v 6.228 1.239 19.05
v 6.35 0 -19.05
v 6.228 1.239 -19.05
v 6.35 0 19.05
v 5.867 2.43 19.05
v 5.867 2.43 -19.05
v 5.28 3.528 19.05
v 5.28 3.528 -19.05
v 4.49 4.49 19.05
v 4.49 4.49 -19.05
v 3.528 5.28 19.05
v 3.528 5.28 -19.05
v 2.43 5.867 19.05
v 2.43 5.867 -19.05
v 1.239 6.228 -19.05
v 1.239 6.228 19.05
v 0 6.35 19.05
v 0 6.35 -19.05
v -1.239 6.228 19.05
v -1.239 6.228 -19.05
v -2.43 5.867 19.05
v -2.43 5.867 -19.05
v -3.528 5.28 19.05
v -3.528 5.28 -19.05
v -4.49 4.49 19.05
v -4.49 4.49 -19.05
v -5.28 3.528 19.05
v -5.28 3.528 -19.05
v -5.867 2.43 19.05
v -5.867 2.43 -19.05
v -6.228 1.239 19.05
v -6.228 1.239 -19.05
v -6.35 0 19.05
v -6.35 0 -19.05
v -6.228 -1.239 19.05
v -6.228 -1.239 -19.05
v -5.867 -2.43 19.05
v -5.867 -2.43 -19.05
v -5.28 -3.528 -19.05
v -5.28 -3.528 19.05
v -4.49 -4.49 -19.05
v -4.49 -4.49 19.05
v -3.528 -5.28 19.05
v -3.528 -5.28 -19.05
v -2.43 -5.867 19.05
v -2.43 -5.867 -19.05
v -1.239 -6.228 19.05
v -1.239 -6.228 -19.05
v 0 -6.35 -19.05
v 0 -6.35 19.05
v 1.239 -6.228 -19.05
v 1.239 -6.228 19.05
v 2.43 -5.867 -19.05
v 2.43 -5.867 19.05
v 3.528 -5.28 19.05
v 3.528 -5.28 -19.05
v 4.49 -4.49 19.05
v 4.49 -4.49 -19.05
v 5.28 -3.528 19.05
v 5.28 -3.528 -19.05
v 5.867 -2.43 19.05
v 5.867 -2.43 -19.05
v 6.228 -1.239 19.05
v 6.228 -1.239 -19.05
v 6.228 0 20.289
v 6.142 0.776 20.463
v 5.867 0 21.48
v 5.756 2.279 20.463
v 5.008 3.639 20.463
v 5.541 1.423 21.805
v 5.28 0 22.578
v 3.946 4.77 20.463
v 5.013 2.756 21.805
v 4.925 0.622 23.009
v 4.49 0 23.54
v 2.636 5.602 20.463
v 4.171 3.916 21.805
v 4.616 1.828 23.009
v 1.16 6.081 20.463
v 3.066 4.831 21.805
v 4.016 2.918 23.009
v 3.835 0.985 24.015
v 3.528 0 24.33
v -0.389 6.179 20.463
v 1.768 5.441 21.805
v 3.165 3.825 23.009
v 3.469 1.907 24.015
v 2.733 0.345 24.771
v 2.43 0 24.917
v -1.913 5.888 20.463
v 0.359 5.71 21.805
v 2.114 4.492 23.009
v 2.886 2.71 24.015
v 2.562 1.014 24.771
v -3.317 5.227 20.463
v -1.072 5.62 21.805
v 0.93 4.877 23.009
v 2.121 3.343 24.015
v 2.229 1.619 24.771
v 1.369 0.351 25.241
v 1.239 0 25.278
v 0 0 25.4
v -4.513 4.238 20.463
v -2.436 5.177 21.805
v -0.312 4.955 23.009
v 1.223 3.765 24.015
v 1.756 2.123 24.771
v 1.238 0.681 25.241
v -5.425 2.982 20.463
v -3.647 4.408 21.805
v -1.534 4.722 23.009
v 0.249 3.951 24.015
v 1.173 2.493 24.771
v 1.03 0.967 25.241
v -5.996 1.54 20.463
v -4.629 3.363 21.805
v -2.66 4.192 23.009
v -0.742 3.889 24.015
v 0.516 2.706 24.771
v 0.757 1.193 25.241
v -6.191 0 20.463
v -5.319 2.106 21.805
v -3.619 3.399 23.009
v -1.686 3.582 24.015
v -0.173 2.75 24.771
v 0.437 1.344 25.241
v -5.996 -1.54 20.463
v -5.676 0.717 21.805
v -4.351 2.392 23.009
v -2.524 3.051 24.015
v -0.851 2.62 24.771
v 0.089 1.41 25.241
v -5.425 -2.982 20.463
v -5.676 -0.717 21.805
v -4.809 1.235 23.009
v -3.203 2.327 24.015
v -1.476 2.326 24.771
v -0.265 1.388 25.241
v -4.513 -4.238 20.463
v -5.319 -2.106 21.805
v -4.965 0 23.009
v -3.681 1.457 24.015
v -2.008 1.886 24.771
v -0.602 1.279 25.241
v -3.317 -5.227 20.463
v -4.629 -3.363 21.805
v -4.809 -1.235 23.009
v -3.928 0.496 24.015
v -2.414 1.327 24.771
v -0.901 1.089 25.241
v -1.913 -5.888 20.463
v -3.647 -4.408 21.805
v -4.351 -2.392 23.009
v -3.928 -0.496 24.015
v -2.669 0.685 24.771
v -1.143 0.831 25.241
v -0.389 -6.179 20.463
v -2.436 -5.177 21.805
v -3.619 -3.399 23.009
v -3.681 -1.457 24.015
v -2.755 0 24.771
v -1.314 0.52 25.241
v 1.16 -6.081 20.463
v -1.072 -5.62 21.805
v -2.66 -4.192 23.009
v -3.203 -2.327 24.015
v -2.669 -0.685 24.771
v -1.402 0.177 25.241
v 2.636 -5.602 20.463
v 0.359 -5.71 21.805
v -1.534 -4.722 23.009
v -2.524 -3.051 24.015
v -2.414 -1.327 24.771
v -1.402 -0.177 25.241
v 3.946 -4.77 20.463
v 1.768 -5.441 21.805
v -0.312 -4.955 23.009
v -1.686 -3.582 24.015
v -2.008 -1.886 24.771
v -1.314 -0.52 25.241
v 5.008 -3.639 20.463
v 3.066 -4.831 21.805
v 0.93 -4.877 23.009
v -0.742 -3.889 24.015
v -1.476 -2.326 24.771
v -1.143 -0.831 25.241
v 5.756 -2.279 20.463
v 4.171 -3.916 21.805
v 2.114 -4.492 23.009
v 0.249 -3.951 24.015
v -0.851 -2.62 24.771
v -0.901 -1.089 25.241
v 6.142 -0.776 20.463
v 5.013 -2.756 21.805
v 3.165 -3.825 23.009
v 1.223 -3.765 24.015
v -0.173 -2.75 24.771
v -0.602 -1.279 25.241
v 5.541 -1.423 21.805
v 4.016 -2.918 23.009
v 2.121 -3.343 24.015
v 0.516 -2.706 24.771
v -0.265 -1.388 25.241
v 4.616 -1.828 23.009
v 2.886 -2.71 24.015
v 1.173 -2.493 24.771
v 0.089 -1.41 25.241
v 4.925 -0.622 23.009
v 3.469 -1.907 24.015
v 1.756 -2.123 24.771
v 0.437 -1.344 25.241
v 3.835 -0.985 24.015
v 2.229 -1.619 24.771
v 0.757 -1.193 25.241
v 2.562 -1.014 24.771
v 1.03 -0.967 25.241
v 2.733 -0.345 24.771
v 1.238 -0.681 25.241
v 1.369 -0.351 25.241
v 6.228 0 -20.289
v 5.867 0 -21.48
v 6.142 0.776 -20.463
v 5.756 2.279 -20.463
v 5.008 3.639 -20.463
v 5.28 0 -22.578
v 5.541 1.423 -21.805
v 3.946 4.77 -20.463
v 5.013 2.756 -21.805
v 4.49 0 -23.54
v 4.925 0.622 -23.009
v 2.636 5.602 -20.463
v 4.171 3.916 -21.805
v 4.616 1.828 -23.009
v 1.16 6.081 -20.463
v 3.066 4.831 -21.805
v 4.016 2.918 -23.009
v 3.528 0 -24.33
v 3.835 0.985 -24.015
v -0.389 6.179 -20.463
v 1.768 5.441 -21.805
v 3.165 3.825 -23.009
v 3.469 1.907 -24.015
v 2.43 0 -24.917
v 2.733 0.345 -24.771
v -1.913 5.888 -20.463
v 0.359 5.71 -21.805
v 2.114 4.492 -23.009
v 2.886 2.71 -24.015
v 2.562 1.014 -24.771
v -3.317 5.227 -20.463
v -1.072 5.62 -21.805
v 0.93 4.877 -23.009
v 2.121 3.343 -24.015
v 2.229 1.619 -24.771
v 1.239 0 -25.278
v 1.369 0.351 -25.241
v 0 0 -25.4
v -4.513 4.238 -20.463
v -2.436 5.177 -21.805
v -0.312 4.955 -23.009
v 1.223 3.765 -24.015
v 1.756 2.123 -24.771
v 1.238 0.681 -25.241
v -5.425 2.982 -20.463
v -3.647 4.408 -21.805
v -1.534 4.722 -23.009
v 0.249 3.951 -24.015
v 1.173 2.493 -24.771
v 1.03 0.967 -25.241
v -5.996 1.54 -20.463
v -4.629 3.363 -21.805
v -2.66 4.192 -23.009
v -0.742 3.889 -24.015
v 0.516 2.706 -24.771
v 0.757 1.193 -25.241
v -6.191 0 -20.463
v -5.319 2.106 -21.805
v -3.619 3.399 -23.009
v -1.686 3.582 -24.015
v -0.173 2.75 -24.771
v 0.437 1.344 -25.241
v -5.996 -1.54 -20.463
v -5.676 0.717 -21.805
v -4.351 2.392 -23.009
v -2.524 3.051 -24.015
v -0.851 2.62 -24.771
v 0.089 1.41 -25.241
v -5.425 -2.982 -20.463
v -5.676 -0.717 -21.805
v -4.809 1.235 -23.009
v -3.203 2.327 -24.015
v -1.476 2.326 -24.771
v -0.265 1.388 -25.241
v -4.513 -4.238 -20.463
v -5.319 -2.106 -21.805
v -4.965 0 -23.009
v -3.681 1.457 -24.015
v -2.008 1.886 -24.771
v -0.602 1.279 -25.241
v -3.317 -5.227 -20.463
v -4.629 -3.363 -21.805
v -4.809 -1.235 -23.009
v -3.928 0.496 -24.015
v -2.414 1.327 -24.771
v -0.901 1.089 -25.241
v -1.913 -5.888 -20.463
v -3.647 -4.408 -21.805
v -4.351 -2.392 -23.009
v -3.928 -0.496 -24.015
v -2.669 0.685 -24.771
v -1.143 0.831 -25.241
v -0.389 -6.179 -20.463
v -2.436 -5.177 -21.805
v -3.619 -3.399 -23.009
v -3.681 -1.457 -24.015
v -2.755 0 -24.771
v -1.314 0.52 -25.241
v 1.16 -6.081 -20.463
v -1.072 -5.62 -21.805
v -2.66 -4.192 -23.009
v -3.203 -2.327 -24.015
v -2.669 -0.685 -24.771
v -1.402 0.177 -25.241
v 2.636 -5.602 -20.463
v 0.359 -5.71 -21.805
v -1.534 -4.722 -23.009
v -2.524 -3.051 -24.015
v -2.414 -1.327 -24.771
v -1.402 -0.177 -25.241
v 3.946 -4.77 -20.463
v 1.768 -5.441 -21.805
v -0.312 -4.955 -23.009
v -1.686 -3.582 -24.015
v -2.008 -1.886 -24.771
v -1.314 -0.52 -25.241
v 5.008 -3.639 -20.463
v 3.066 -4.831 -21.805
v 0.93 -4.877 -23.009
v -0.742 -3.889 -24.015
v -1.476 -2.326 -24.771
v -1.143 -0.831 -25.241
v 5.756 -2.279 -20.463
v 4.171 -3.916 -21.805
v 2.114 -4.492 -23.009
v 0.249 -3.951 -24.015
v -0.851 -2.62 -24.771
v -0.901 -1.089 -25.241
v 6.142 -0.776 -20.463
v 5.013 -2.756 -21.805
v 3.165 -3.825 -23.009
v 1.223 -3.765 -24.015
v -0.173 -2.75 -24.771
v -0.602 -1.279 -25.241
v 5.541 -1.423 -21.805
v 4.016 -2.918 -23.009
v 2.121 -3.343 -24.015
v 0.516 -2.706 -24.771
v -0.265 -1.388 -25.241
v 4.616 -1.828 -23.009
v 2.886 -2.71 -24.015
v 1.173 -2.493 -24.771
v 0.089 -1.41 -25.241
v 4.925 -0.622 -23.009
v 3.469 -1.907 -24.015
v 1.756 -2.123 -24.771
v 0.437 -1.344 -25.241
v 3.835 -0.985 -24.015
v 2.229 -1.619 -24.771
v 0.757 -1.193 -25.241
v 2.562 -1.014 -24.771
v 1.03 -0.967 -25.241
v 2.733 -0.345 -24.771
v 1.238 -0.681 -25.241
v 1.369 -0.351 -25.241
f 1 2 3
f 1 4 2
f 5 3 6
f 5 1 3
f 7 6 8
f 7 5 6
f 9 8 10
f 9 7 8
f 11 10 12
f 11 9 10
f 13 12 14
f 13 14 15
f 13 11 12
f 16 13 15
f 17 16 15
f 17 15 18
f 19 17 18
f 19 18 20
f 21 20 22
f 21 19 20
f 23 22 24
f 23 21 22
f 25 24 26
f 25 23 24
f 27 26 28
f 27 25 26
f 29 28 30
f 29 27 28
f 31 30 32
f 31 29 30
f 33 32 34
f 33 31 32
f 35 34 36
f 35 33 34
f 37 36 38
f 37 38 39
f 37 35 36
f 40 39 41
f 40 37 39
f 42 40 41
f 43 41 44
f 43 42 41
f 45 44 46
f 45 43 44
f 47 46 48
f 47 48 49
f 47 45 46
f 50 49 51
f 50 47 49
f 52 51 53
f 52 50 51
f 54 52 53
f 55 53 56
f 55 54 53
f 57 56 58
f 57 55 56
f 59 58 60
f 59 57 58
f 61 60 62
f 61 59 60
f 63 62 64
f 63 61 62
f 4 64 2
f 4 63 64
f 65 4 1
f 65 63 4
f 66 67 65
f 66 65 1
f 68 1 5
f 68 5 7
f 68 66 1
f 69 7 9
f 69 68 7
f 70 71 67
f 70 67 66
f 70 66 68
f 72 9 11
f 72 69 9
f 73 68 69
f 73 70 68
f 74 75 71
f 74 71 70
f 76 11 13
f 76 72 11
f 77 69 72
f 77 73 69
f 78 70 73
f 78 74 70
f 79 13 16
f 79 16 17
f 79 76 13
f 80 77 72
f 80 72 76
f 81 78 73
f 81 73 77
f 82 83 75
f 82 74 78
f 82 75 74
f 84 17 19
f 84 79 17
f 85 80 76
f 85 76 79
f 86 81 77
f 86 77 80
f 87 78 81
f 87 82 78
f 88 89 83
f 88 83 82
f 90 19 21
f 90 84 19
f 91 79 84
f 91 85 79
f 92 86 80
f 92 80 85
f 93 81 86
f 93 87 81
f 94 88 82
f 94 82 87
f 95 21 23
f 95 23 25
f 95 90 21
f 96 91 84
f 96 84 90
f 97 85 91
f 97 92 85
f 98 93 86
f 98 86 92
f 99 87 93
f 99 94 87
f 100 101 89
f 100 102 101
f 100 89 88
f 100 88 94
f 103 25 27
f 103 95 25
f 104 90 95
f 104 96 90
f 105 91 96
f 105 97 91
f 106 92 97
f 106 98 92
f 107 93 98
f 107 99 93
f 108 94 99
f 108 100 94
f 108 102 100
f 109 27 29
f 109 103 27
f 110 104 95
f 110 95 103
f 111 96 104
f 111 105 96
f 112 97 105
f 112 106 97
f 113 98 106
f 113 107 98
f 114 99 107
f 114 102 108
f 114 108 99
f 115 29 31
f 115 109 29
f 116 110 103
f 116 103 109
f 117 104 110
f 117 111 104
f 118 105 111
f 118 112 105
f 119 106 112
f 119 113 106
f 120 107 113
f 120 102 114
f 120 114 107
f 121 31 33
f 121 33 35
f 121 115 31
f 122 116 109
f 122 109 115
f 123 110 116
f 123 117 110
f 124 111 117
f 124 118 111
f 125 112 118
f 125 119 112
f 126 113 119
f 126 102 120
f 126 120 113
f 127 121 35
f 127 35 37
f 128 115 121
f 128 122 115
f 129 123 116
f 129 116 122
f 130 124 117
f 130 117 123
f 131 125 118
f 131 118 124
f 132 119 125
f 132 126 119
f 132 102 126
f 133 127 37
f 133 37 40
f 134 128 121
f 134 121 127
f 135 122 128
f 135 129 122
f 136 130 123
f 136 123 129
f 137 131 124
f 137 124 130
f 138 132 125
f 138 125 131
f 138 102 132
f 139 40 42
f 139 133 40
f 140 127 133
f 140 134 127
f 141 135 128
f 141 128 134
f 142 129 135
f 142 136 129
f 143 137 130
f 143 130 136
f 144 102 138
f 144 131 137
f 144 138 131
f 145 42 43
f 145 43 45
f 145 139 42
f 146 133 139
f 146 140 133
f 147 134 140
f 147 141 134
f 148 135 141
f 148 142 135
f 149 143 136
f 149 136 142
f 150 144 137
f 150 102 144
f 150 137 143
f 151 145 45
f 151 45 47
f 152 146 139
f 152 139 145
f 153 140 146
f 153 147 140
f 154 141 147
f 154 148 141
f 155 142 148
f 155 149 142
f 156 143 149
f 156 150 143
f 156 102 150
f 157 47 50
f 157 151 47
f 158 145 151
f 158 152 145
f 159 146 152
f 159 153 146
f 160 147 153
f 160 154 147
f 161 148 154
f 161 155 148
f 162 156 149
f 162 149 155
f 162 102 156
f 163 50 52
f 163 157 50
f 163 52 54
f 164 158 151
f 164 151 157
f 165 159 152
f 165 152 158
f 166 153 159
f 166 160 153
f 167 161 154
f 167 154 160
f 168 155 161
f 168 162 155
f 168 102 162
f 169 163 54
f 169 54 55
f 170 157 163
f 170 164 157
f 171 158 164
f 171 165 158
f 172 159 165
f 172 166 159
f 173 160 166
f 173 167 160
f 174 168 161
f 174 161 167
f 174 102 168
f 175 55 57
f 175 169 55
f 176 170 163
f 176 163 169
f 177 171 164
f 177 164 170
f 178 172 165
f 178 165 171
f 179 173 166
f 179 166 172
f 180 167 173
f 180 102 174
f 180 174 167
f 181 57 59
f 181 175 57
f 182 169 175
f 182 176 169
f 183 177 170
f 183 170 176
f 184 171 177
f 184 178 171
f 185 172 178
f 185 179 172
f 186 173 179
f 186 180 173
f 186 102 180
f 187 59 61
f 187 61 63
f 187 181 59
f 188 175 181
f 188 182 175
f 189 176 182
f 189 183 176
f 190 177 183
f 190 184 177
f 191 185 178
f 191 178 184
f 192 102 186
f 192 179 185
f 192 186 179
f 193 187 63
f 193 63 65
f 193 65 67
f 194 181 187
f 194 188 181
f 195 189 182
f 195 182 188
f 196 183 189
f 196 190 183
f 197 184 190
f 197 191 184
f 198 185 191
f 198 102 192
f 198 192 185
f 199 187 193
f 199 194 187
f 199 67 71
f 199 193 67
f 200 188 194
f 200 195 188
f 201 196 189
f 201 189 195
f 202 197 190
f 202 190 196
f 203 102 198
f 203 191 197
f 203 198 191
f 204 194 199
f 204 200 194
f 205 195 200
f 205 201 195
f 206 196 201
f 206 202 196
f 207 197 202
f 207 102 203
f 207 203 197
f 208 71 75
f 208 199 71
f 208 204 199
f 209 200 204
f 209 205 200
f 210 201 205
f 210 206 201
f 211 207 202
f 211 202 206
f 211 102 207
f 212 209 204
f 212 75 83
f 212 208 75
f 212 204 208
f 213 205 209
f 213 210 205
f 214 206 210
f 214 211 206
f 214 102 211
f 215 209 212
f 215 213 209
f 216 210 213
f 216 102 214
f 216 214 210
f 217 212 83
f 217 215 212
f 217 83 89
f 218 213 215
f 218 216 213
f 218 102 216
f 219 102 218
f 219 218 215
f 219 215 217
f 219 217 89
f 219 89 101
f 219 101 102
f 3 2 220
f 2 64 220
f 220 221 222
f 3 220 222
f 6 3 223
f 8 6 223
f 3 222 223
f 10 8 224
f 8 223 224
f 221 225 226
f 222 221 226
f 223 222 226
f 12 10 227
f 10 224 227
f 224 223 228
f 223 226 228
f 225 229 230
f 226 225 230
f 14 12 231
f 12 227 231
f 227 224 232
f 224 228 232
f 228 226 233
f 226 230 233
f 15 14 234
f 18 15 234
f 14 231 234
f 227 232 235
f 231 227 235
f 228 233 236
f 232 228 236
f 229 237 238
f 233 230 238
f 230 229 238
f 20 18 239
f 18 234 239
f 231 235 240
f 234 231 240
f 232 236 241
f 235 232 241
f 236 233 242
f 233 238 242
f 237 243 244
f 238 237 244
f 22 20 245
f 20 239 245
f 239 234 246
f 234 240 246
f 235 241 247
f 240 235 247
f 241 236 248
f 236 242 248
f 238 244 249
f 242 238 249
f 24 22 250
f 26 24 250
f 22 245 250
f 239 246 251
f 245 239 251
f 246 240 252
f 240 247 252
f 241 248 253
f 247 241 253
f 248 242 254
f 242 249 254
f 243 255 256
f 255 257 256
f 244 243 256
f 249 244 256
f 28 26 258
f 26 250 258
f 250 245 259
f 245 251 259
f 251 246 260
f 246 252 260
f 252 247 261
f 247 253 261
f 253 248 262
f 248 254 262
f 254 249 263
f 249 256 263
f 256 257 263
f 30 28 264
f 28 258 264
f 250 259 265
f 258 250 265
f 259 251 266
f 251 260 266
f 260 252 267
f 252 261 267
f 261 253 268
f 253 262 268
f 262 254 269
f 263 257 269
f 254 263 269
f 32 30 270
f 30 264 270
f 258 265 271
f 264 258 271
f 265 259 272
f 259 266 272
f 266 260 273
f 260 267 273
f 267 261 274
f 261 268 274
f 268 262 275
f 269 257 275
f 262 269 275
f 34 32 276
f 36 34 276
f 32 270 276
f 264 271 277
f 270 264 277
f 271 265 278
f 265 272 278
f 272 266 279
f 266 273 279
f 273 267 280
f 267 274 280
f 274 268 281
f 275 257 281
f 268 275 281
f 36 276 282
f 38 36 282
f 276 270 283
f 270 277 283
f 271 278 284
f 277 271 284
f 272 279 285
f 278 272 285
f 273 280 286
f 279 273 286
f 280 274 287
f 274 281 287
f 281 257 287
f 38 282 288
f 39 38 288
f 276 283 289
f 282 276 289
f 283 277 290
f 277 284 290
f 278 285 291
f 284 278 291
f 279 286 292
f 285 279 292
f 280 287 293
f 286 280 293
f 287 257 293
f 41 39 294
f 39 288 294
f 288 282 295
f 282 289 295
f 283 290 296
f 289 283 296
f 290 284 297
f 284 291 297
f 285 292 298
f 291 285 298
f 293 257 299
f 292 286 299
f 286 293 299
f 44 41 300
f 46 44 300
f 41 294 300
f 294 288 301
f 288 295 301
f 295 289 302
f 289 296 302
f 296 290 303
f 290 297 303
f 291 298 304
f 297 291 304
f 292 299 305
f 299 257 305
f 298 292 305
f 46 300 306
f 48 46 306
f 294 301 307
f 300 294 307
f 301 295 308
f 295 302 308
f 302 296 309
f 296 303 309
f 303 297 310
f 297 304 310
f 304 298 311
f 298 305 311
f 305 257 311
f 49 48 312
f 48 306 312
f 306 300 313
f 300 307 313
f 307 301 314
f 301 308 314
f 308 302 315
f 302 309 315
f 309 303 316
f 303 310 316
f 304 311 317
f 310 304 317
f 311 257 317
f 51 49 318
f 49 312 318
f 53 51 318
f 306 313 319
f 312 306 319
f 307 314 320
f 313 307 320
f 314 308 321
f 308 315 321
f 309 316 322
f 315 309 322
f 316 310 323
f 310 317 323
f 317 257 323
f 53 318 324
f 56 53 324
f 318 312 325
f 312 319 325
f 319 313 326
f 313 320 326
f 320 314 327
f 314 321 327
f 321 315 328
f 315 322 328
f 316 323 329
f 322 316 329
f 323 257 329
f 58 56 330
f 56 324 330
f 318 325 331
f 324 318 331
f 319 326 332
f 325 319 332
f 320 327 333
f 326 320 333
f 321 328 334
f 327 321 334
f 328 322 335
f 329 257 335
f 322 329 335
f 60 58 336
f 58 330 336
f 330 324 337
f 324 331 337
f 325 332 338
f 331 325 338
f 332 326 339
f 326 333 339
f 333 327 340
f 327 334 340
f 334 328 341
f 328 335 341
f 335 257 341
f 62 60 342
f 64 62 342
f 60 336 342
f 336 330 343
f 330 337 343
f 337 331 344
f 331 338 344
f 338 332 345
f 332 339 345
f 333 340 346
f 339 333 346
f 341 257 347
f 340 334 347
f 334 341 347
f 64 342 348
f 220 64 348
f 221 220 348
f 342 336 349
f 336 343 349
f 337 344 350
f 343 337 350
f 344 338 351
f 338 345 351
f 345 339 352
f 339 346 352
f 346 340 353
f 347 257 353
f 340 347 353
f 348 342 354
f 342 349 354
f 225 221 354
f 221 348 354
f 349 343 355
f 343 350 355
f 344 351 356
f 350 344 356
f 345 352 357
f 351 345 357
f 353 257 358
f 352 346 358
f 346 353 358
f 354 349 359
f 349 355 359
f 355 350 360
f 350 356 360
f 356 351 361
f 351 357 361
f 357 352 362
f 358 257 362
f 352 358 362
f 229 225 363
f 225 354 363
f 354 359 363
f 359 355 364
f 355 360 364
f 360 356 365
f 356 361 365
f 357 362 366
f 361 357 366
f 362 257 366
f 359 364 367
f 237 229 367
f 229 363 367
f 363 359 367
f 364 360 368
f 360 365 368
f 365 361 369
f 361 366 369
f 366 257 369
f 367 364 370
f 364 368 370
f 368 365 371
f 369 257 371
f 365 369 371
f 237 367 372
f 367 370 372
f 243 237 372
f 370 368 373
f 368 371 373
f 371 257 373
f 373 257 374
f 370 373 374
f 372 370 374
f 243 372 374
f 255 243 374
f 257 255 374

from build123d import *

# Parameters (mm, degrees)
F0_R     = 6.35
F1_DEPTH = 25.4
F2_R     = 6.35


with BuildPart() as f1:
    # F0 (on Top) → F1 (new body)
    with BuildSketch(Plane.XY):
        Circle(F0_R)
    extrude(amount=F1_DEPTH)

    # F2
    f2_edges = [f1.edges().sort_by_distance(p)[0] for p in [
        (-6.35, 0, 25.4),
    ]]
    fillet(f2_edges, radius=F2_R)

    # F3: F1 across face


with BuildPart() as f1_1:
    add(f1.part)
    add(f1.part.mirror(Plane(origin=(0, 0, 0), x_dir=(1, 0, 0), z_dir=(0, 0, -1))))


solid = f1_1.part
